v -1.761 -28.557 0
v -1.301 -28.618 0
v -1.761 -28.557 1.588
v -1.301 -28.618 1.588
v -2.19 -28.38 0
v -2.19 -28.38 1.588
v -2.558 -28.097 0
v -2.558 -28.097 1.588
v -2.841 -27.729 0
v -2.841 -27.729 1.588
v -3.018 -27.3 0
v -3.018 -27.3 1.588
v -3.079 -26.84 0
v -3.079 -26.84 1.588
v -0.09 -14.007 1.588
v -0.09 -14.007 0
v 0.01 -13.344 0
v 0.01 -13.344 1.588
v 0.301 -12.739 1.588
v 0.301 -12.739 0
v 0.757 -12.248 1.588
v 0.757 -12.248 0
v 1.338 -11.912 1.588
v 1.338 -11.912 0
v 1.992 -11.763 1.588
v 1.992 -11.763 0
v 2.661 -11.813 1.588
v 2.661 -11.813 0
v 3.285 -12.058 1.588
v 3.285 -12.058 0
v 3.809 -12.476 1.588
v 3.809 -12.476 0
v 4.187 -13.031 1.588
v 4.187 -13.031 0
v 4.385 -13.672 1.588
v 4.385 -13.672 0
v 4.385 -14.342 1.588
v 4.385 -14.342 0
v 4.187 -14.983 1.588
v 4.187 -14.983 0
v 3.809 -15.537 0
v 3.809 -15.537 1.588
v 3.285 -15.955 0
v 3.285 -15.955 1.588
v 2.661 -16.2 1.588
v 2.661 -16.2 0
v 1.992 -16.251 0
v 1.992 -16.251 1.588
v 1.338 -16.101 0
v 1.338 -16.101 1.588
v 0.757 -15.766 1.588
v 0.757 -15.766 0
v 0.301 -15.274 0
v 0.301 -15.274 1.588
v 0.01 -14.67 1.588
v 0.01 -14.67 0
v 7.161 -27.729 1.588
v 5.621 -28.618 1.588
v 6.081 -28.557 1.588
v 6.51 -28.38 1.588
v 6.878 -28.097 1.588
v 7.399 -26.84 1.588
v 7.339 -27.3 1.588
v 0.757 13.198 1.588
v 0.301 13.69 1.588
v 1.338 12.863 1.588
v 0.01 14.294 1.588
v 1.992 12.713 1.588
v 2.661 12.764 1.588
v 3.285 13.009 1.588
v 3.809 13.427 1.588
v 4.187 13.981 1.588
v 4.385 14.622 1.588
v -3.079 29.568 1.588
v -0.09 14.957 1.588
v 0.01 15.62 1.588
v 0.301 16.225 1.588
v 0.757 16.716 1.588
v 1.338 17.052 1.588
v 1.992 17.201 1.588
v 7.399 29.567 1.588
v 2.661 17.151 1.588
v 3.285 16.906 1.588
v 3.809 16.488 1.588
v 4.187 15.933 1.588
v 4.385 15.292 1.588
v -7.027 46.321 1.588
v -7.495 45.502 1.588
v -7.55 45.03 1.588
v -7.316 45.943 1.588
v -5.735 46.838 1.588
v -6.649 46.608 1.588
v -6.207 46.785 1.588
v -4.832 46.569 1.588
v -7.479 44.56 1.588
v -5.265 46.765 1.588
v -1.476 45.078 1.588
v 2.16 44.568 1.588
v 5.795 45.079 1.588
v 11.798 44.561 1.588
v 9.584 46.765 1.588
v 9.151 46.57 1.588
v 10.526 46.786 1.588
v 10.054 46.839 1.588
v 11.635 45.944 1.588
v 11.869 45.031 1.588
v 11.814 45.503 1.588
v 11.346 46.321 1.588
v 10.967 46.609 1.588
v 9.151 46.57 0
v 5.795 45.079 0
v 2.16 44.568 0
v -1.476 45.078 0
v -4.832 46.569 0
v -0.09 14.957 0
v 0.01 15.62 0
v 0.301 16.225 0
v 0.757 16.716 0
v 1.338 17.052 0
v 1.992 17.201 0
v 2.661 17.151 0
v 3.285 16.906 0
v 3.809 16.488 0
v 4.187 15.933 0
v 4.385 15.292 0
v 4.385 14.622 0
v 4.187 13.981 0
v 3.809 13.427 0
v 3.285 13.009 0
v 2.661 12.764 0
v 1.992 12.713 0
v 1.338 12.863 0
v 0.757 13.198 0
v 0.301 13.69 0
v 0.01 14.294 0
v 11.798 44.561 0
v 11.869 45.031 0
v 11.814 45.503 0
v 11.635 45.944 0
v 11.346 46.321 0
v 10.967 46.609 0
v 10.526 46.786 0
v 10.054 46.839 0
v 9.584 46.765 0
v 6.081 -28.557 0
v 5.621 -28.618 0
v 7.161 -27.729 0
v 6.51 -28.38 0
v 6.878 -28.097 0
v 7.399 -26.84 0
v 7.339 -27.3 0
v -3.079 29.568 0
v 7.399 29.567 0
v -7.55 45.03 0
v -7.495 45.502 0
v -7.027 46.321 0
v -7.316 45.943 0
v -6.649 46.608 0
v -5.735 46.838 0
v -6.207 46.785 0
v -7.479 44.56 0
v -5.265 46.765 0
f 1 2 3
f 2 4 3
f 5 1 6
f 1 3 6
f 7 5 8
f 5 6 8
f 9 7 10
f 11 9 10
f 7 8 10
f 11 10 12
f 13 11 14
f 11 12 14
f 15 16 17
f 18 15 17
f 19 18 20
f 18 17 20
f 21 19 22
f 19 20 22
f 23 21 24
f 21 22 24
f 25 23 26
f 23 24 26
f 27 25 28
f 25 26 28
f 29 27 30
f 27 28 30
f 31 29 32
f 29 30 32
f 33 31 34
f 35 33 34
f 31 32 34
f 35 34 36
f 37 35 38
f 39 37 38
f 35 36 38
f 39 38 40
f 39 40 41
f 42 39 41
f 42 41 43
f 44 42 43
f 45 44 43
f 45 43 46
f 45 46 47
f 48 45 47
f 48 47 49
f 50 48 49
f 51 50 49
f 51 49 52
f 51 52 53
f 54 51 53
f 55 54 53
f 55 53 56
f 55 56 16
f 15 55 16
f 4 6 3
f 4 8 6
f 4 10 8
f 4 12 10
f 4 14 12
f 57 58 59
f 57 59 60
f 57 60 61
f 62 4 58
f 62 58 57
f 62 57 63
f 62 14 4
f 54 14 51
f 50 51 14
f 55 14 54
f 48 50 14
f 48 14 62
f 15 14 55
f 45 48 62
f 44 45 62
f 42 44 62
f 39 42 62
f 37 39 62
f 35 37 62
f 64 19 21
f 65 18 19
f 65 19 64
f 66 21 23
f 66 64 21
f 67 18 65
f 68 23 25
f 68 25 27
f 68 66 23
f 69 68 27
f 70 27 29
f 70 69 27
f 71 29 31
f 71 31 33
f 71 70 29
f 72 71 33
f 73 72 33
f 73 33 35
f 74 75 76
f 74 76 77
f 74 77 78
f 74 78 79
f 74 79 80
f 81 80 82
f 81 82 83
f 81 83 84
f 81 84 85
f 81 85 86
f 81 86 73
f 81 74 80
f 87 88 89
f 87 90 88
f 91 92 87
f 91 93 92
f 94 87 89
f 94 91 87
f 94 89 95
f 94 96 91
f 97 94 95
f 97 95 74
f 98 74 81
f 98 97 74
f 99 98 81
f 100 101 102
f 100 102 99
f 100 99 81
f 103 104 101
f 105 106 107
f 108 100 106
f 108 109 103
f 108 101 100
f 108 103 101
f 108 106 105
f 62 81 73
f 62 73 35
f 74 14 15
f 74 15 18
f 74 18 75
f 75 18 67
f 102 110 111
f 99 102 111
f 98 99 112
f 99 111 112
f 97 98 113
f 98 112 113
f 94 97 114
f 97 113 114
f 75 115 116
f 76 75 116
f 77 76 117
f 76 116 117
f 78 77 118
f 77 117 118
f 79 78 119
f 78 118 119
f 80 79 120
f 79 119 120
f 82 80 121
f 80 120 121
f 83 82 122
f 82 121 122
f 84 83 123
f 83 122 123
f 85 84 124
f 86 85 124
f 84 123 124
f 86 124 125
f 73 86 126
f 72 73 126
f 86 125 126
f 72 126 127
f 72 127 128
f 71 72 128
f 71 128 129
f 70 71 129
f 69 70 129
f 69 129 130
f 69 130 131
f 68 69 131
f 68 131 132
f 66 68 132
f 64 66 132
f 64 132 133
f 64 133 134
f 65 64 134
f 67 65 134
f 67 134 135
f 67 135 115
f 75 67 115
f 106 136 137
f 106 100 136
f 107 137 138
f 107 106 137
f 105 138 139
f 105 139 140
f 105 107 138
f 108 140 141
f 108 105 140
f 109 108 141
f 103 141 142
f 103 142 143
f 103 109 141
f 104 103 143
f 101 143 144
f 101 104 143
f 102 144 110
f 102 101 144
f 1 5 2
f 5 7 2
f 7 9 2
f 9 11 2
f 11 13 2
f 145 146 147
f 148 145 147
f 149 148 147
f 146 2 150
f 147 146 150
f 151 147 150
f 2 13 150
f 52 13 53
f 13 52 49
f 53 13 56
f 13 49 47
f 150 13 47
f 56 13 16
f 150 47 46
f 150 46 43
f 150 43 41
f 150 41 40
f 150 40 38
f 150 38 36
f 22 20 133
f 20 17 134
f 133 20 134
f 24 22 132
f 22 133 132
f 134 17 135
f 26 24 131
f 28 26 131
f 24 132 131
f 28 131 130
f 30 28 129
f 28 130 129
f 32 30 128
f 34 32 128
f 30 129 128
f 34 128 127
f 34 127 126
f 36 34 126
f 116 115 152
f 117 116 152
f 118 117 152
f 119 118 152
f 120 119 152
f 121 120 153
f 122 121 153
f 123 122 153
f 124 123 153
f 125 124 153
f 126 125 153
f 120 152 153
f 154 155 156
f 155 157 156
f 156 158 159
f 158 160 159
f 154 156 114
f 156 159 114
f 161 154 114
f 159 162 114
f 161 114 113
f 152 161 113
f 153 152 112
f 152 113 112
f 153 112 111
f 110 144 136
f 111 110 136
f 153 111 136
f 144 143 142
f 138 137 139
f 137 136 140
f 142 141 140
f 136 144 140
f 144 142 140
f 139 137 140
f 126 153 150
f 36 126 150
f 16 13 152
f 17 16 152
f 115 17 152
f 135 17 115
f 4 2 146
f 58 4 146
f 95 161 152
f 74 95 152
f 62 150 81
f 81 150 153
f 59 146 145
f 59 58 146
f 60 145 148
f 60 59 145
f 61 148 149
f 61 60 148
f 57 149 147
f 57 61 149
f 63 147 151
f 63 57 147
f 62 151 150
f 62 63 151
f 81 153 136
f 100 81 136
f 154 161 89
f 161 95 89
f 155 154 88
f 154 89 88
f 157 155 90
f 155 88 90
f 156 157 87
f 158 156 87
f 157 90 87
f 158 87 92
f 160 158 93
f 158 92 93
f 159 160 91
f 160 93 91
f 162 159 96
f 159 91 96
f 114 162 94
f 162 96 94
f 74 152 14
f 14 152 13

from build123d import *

# Parameters (mm, degrees)
SKETCH1_R            = 2
BOSS_EXTRUDE1_DEPTH  = 1.5875
FILLET2_R            = 1.778
M4_CLEARANCE_HOLE2_D = 4.5


with BuildPart() as part:
    # Sketch1 → Boss-Extrude1 (new body)
    with BuildSketch(Plane.XY):
        with BuildLine():
            Line((-3.078924099, -28.617866551), (2.159951047, -28.617866551))
            Line((2.159951047, -28.617866551), (7.399260817, -28.617866551))
            Line((7.399260817, -28.617866551), (7.399260817, 14.567438128))
            Line((7.399260817, 14.567438128), (7.399260817, 29.567438098))
            Line((7.399260817, 29.567438098), (13.897648784, 51.719401208))
            ThreePointArc((13.897648784, 51.719401208), (2.158996515, 44.568125735), (-9.579655755, 51.719401208))
            Line((-9.579655755, 51.719401208), (-3.078924099, 29.568125765))
            Line((-3.078924099, 29.568125765), (-3.078924099, -28.617866551))
        make_face()
        with BuildLine():
            ThreePointArc((4.159951047, -14.006866551), (3.574164609, -15.421080114), (2.159951047, -16.006866551))
            ThreePointArc((2.159951047, -16.006866551), (0.745737485, -12.592652989), (4.159951047, -14.006866551))
        make_face(mode=Mode.SUBTRACT)
        with Locations((2.159951047, 14.957125769)):
            Circle(SKETCH1_R, mode=Mode.SUBTRACT)
    extrude(amount=BOSS_EXTRUDE1_DEPTH)

    # Fillet2
    fillet2_edges = [part.edges().sort_by_distance(p)[0] for p in [
        (-9.579655755, 51.719401208, 0.79375),
        (13.897648784, 51.719401208, 0.79375),
        (7.399260817, -28.617866551, 0.79375),
        (-3.078924099, -28.617866551, 0.79375),
    ]]
    fillet(fillet2_edges, radius=FILLET2_R)

    # M4 Clearance Hole2 (through all)
    with Locations(Plane.XY.offset(1.5875)):
        with Locations((2.159951047, 14.957125769), (2.159951047, -14.006866551)):
            Hole(M4_CLEARANCE_HOLE2_D / 2)


solid = part.part
